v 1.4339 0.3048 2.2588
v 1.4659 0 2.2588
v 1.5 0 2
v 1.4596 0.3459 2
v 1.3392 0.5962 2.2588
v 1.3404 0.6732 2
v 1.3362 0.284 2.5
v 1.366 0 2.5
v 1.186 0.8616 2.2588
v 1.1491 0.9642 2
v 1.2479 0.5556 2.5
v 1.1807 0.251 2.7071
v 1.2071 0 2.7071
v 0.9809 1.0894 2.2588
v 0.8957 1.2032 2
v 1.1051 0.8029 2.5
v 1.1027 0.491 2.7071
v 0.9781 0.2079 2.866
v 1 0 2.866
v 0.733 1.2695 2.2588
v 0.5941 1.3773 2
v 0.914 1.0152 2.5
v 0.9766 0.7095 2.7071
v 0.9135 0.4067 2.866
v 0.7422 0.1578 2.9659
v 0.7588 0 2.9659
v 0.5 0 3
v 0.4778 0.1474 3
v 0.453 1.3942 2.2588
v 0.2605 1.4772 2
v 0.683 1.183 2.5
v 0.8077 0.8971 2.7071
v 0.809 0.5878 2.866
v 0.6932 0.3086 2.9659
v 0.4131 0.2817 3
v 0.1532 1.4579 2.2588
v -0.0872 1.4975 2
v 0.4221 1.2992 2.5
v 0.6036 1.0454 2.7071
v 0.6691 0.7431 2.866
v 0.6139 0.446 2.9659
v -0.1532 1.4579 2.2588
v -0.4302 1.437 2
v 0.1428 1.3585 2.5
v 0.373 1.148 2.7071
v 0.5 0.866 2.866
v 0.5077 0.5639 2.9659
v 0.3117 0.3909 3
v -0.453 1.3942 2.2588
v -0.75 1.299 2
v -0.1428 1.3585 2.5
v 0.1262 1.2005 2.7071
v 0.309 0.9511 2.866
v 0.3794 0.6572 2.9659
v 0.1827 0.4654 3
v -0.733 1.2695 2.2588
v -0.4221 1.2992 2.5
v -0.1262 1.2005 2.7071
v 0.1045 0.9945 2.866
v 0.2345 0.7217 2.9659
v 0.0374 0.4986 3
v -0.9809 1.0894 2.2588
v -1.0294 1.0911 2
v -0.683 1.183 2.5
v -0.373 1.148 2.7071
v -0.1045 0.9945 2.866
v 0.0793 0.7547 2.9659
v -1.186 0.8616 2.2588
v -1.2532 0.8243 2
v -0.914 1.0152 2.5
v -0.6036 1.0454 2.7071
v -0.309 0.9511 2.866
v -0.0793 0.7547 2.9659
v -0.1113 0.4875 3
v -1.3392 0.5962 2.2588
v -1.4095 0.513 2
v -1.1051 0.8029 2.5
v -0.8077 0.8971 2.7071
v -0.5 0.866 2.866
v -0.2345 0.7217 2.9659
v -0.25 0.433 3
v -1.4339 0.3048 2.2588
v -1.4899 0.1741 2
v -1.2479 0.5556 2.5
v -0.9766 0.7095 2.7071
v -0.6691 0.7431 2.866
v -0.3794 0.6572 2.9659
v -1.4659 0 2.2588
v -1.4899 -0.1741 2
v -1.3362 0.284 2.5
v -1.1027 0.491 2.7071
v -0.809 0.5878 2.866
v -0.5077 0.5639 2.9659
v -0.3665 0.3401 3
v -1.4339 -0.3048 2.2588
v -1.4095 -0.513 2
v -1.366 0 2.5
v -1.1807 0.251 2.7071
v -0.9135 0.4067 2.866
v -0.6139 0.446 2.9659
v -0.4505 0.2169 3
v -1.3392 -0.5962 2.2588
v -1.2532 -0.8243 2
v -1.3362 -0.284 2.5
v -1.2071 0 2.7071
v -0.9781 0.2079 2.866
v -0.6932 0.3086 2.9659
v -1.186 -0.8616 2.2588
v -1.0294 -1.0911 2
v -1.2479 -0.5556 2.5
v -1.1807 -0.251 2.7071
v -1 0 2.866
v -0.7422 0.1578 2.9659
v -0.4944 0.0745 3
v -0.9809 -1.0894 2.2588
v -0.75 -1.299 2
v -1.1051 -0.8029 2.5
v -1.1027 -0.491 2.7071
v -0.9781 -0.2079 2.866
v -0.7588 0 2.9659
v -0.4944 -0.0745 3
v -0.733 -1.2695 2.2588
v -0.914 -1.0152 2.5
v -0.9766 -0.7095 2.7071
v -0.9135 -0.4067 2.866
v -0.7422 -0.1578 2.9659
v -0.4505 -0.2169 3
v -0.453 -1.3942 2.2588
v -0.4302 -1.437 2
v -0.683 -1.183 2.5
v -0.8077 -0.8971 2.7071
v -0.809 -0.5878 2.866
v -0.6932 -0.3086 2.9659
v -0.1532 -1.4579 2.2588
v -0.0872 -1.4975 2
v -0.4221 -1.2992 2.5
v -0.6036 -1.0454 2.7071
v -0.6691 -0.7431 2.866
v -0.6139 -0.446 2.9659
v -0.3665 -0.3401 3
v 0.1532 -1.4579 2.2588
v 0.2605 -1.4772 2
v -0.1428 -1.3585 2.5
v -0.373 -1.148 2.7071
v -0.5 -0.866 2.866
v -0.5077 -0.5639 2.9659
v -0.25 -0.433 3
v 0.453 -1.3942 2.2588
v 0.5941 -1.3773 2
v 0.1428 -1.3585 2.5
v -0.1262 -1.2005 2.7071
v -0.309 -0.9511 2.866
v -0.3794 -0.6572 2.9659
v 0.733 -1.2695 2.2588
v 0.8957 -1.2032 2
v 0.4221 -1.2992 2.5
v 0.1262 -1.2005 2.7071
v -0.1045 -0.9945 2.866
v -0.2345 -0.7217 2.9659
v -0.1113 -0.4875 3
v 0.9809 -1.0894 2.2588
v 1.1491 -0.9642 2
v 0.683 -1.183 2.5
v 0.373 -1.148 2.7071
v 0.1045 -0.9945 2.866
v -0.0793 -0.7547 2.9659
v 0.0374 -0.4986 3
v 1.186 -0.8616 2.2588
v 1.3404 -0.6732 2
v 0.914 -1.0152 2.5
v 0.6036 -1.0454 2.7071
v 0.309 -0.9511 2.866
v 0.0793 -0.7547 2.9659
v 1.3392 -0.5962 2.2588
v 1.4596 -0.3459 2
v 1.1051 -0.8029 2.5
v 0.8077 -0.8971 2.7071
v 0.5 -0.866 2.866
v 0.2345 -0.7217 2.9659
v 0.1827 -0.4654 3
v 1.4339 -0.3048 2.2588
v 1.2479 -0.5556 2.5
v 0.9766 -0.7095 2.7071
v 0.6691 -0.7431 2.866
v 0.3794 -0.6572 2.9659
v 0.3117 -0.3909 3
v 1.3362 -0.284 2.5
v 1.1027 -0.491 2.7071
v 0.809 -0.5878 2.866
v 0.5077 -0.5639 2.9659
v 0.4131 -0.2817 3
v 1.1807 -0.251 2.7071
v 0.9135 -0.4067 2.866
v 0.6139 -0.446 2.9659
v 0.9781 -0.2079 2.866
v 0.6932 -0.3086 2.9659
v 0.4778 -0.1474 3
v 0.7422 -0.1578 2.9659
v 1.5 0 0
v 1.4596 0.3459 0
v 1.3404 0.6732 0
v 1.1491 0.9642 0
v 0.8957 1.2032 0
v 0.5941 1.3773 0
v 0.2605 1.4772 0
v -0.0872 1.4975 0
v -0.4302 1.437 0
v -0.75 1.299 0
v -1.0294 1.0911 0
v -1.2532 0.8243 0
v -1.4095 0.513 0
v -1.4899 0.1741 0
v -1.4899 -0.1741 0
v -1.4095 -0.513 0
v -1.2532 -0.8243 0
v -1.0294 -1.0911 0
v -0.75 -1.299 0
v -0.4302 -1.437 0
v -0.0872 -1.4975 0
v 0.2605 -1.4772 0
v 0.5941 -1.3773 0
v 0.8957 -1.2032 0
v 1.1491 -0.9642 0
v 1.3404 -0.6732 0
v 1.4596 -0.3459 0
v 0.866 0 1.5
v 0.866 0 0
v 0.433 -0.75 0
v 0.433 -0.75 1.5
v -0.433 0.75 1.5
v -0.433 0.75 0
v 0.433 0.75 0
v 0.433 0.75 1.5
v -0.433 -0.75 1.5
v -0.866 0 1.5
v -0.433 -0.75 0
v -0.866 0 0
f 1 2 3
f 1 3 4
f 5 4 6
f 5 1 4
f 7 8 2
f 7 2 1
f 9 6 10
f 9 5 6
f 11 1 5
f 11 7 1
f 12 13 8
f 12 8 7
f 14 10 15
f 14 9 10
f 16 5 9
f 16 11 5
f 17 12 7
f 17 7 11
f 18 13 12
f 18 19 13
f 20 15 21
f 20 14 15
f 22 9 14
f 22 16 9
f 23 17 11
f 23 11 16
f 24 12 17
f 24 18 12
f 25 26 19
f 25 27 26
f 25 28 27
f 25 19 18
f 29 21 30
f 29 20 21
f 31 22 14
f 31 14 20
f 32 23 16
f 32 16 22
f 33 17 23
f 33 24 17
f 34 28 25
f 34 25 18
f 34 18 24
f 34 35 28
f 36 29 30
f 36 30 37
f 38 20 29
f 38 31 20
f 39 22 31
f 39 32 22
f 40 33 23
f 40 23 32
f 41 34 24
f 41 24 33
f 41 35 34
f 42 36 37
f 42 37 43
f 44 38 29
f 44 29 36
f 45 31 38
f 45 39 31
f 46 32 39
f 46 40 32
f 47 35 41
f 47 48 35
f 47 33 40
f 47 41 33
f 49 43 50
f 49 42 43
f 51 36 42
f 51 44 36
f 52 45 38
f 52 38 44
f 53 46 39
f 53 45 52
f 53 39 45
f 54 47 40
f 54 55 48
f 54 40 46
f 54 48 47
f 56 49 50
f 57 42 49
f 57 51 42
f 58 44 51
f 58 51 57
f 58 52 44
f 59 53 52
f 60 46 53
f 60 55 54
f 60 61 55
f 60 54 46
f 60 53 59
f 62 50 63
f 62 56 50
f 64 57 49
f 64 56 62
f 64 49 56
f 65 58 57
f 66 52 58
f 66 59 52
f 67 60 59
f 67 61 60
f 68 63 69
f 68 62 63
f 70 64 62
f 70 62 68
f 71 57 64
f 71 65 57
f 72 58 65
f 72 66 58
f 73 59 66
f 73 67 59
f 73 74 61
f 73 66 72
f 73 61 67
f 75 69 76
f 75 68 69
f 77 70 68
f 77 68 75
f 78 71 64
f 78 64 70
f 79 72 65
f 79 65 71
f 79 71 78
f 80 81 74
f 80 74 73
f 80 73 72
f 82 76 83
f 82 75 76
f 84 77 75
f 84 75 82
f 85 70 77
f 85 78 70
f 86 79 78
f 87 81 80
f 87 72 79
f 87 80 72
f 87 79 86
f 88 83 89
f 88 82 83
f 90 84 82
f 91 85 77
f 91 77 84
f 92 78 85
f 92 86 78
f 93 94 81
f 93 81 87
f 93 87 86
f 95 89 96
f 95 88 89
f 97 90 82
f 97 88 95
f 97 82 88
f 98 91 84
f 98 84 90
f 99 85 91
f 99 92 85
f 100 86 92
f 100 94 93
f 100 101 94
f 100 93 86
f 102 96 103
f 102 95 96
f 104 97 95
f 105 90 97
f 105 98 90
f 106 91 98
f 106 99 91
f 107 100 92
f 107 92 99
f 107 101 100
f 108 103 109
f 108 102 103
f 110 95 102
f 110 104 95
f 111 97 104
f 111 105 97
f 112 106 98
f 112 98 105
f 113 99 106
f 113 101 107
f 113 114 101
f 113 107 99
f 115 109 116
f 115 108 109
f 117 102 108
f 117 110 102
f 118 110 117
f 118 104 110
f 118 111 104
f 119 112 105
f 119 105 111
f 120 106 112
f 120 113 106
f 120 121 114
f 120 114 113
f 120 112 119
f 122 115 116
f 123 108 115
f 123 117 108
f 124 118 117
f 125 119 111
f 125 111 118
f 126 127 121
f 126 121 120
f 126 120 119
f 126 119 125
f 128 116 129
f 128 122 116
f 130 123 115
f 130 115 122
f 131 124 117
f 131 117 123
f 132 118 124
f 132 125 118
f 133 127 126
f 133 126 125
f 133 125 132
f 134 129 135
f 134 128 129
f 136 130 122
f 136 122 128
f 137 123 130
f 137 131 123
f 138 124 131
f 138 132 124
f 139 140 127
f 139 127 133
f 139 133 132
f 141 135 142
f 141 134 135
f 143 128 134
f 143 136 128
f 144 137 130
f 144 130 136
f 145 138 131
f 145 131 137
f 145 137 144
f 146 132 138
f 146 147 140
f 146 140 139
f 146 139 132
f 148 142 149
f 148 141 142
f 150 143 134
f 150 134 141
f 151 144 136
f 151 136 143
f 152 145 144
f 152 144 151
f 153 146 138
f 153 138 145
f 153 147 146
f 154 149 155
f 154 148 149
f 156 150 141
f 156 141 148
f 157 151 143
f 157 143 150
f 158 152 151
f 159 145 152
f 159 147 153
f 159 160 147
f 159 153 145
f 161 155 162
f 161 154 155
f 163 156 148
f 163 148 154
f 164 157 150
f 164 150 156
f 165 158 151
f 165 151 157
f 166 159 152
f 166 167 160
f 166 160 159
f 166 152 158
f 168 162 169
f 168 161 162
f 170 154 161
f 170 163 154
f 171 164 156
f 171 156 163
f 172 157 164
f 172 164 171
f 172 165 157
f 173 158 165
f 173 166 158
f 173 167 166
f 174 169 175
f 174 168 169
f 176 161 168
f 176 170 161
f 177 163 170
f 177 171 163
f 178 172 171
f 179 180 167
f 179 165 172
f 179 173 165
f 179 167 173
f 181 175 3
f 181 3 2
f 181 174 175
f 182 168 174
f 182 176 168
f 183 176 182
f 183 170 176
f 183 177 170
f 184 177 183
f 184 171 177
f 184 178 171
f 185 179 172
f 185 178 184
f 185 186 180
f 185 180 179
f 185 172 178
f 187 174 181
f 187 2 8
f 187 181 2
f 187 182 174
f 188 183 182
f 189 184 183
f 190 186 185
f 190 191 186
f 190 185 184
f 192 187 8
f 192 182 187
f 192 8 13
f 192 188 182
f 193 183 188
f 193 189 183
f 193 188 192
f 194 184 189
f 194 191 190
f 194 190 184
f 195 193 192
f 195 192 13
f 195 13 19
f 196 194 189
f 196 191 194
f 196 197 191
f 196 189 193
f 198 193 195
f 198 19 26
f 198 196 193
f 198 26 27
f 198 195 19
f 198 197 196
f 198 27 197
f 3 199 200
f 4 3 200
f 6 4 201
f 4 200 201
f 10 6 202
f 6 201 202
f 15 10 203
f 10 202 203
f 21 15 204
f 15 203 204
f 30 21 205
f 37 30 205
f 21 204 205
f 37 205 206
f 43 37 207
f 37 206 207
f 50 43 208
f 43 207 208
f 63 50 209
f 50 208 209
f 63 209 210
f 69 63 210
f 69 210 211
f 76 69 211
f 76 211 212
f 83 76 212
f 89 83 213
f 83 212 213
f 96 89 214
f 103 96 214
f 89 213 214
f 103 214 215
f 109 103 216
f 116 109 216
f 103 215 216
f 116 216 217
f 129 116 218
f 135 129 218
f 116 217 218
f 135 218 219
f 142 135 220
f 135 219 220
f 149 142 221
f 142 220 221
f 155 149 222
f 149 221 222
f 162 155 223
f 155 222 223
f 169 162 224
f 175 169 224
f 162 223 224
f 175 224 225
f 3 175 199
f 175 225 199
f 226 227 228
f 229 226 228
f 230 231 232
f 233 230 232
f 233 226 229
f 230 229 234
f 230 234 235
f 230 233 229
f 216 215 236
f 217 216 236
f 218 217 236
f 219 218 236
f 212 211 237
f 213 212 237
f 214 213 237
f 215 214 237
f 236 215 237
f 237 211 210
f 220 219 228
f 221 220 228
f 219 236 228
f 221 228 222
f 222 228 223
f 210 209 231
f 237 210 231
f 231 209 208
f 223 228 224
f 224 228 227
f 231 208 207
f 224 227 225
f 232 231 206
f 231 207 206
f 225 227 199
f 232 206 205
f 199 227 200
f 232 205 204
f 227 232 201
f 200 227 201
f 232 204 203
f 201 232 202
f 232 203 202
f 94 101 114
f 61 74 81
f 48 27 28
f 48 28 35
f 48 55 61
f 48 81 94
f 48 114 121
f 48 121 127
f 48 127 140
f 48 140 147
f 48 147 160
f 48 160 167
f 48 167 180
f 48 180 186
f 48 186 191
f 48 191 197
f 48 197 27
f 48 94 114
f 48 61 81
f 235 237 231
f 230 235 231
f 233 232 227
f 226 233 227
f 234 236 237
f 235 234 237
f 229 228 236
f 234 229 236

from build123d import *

# Parameters (mm, degrees)
SKETCH_1_R          = 1.5
EXTRUDE_1_DEPTH     = 3
FILLET_1_R          = 1
CUT_EXTRUDE_1_DEPTH = 1.5


with BuildPart() as part:
    # 草图1 → 凸台-拉伸1 (new body)
    with BuildSketch(Plane.XY):
        Circle(SKETCH_1_R)
    extrude(amount=EXTRUDE_1_DEPTH)

    # 圆角1
    fillet_1_edges = [part.edges().sort_by_distance(p)[0] for p in [
        (-1.5, 0, 3),
    ]]
    fillet(fillet_1_edges, radius=FILLET_1_R)

    # 草图2 → 切除-拉伸1 (cut)
    with BuildSketch(Plane(origin=(0, 0, 0), x_dir=(-1, 0, 0), z_dir=(0, 0, -1))):
        Polygon((0.866025404, 0), (0.433012702, 0.75), (-0.433012702, 0.75), (-0.866025404, 0), (-0.433012702, -0.75), (0.433012702, -0.75), align=None)
    extrude(amount=-CUT_EXTRUDE_1_DEPTH, mode=Mode.SUBTRACT)


solid = part.part
